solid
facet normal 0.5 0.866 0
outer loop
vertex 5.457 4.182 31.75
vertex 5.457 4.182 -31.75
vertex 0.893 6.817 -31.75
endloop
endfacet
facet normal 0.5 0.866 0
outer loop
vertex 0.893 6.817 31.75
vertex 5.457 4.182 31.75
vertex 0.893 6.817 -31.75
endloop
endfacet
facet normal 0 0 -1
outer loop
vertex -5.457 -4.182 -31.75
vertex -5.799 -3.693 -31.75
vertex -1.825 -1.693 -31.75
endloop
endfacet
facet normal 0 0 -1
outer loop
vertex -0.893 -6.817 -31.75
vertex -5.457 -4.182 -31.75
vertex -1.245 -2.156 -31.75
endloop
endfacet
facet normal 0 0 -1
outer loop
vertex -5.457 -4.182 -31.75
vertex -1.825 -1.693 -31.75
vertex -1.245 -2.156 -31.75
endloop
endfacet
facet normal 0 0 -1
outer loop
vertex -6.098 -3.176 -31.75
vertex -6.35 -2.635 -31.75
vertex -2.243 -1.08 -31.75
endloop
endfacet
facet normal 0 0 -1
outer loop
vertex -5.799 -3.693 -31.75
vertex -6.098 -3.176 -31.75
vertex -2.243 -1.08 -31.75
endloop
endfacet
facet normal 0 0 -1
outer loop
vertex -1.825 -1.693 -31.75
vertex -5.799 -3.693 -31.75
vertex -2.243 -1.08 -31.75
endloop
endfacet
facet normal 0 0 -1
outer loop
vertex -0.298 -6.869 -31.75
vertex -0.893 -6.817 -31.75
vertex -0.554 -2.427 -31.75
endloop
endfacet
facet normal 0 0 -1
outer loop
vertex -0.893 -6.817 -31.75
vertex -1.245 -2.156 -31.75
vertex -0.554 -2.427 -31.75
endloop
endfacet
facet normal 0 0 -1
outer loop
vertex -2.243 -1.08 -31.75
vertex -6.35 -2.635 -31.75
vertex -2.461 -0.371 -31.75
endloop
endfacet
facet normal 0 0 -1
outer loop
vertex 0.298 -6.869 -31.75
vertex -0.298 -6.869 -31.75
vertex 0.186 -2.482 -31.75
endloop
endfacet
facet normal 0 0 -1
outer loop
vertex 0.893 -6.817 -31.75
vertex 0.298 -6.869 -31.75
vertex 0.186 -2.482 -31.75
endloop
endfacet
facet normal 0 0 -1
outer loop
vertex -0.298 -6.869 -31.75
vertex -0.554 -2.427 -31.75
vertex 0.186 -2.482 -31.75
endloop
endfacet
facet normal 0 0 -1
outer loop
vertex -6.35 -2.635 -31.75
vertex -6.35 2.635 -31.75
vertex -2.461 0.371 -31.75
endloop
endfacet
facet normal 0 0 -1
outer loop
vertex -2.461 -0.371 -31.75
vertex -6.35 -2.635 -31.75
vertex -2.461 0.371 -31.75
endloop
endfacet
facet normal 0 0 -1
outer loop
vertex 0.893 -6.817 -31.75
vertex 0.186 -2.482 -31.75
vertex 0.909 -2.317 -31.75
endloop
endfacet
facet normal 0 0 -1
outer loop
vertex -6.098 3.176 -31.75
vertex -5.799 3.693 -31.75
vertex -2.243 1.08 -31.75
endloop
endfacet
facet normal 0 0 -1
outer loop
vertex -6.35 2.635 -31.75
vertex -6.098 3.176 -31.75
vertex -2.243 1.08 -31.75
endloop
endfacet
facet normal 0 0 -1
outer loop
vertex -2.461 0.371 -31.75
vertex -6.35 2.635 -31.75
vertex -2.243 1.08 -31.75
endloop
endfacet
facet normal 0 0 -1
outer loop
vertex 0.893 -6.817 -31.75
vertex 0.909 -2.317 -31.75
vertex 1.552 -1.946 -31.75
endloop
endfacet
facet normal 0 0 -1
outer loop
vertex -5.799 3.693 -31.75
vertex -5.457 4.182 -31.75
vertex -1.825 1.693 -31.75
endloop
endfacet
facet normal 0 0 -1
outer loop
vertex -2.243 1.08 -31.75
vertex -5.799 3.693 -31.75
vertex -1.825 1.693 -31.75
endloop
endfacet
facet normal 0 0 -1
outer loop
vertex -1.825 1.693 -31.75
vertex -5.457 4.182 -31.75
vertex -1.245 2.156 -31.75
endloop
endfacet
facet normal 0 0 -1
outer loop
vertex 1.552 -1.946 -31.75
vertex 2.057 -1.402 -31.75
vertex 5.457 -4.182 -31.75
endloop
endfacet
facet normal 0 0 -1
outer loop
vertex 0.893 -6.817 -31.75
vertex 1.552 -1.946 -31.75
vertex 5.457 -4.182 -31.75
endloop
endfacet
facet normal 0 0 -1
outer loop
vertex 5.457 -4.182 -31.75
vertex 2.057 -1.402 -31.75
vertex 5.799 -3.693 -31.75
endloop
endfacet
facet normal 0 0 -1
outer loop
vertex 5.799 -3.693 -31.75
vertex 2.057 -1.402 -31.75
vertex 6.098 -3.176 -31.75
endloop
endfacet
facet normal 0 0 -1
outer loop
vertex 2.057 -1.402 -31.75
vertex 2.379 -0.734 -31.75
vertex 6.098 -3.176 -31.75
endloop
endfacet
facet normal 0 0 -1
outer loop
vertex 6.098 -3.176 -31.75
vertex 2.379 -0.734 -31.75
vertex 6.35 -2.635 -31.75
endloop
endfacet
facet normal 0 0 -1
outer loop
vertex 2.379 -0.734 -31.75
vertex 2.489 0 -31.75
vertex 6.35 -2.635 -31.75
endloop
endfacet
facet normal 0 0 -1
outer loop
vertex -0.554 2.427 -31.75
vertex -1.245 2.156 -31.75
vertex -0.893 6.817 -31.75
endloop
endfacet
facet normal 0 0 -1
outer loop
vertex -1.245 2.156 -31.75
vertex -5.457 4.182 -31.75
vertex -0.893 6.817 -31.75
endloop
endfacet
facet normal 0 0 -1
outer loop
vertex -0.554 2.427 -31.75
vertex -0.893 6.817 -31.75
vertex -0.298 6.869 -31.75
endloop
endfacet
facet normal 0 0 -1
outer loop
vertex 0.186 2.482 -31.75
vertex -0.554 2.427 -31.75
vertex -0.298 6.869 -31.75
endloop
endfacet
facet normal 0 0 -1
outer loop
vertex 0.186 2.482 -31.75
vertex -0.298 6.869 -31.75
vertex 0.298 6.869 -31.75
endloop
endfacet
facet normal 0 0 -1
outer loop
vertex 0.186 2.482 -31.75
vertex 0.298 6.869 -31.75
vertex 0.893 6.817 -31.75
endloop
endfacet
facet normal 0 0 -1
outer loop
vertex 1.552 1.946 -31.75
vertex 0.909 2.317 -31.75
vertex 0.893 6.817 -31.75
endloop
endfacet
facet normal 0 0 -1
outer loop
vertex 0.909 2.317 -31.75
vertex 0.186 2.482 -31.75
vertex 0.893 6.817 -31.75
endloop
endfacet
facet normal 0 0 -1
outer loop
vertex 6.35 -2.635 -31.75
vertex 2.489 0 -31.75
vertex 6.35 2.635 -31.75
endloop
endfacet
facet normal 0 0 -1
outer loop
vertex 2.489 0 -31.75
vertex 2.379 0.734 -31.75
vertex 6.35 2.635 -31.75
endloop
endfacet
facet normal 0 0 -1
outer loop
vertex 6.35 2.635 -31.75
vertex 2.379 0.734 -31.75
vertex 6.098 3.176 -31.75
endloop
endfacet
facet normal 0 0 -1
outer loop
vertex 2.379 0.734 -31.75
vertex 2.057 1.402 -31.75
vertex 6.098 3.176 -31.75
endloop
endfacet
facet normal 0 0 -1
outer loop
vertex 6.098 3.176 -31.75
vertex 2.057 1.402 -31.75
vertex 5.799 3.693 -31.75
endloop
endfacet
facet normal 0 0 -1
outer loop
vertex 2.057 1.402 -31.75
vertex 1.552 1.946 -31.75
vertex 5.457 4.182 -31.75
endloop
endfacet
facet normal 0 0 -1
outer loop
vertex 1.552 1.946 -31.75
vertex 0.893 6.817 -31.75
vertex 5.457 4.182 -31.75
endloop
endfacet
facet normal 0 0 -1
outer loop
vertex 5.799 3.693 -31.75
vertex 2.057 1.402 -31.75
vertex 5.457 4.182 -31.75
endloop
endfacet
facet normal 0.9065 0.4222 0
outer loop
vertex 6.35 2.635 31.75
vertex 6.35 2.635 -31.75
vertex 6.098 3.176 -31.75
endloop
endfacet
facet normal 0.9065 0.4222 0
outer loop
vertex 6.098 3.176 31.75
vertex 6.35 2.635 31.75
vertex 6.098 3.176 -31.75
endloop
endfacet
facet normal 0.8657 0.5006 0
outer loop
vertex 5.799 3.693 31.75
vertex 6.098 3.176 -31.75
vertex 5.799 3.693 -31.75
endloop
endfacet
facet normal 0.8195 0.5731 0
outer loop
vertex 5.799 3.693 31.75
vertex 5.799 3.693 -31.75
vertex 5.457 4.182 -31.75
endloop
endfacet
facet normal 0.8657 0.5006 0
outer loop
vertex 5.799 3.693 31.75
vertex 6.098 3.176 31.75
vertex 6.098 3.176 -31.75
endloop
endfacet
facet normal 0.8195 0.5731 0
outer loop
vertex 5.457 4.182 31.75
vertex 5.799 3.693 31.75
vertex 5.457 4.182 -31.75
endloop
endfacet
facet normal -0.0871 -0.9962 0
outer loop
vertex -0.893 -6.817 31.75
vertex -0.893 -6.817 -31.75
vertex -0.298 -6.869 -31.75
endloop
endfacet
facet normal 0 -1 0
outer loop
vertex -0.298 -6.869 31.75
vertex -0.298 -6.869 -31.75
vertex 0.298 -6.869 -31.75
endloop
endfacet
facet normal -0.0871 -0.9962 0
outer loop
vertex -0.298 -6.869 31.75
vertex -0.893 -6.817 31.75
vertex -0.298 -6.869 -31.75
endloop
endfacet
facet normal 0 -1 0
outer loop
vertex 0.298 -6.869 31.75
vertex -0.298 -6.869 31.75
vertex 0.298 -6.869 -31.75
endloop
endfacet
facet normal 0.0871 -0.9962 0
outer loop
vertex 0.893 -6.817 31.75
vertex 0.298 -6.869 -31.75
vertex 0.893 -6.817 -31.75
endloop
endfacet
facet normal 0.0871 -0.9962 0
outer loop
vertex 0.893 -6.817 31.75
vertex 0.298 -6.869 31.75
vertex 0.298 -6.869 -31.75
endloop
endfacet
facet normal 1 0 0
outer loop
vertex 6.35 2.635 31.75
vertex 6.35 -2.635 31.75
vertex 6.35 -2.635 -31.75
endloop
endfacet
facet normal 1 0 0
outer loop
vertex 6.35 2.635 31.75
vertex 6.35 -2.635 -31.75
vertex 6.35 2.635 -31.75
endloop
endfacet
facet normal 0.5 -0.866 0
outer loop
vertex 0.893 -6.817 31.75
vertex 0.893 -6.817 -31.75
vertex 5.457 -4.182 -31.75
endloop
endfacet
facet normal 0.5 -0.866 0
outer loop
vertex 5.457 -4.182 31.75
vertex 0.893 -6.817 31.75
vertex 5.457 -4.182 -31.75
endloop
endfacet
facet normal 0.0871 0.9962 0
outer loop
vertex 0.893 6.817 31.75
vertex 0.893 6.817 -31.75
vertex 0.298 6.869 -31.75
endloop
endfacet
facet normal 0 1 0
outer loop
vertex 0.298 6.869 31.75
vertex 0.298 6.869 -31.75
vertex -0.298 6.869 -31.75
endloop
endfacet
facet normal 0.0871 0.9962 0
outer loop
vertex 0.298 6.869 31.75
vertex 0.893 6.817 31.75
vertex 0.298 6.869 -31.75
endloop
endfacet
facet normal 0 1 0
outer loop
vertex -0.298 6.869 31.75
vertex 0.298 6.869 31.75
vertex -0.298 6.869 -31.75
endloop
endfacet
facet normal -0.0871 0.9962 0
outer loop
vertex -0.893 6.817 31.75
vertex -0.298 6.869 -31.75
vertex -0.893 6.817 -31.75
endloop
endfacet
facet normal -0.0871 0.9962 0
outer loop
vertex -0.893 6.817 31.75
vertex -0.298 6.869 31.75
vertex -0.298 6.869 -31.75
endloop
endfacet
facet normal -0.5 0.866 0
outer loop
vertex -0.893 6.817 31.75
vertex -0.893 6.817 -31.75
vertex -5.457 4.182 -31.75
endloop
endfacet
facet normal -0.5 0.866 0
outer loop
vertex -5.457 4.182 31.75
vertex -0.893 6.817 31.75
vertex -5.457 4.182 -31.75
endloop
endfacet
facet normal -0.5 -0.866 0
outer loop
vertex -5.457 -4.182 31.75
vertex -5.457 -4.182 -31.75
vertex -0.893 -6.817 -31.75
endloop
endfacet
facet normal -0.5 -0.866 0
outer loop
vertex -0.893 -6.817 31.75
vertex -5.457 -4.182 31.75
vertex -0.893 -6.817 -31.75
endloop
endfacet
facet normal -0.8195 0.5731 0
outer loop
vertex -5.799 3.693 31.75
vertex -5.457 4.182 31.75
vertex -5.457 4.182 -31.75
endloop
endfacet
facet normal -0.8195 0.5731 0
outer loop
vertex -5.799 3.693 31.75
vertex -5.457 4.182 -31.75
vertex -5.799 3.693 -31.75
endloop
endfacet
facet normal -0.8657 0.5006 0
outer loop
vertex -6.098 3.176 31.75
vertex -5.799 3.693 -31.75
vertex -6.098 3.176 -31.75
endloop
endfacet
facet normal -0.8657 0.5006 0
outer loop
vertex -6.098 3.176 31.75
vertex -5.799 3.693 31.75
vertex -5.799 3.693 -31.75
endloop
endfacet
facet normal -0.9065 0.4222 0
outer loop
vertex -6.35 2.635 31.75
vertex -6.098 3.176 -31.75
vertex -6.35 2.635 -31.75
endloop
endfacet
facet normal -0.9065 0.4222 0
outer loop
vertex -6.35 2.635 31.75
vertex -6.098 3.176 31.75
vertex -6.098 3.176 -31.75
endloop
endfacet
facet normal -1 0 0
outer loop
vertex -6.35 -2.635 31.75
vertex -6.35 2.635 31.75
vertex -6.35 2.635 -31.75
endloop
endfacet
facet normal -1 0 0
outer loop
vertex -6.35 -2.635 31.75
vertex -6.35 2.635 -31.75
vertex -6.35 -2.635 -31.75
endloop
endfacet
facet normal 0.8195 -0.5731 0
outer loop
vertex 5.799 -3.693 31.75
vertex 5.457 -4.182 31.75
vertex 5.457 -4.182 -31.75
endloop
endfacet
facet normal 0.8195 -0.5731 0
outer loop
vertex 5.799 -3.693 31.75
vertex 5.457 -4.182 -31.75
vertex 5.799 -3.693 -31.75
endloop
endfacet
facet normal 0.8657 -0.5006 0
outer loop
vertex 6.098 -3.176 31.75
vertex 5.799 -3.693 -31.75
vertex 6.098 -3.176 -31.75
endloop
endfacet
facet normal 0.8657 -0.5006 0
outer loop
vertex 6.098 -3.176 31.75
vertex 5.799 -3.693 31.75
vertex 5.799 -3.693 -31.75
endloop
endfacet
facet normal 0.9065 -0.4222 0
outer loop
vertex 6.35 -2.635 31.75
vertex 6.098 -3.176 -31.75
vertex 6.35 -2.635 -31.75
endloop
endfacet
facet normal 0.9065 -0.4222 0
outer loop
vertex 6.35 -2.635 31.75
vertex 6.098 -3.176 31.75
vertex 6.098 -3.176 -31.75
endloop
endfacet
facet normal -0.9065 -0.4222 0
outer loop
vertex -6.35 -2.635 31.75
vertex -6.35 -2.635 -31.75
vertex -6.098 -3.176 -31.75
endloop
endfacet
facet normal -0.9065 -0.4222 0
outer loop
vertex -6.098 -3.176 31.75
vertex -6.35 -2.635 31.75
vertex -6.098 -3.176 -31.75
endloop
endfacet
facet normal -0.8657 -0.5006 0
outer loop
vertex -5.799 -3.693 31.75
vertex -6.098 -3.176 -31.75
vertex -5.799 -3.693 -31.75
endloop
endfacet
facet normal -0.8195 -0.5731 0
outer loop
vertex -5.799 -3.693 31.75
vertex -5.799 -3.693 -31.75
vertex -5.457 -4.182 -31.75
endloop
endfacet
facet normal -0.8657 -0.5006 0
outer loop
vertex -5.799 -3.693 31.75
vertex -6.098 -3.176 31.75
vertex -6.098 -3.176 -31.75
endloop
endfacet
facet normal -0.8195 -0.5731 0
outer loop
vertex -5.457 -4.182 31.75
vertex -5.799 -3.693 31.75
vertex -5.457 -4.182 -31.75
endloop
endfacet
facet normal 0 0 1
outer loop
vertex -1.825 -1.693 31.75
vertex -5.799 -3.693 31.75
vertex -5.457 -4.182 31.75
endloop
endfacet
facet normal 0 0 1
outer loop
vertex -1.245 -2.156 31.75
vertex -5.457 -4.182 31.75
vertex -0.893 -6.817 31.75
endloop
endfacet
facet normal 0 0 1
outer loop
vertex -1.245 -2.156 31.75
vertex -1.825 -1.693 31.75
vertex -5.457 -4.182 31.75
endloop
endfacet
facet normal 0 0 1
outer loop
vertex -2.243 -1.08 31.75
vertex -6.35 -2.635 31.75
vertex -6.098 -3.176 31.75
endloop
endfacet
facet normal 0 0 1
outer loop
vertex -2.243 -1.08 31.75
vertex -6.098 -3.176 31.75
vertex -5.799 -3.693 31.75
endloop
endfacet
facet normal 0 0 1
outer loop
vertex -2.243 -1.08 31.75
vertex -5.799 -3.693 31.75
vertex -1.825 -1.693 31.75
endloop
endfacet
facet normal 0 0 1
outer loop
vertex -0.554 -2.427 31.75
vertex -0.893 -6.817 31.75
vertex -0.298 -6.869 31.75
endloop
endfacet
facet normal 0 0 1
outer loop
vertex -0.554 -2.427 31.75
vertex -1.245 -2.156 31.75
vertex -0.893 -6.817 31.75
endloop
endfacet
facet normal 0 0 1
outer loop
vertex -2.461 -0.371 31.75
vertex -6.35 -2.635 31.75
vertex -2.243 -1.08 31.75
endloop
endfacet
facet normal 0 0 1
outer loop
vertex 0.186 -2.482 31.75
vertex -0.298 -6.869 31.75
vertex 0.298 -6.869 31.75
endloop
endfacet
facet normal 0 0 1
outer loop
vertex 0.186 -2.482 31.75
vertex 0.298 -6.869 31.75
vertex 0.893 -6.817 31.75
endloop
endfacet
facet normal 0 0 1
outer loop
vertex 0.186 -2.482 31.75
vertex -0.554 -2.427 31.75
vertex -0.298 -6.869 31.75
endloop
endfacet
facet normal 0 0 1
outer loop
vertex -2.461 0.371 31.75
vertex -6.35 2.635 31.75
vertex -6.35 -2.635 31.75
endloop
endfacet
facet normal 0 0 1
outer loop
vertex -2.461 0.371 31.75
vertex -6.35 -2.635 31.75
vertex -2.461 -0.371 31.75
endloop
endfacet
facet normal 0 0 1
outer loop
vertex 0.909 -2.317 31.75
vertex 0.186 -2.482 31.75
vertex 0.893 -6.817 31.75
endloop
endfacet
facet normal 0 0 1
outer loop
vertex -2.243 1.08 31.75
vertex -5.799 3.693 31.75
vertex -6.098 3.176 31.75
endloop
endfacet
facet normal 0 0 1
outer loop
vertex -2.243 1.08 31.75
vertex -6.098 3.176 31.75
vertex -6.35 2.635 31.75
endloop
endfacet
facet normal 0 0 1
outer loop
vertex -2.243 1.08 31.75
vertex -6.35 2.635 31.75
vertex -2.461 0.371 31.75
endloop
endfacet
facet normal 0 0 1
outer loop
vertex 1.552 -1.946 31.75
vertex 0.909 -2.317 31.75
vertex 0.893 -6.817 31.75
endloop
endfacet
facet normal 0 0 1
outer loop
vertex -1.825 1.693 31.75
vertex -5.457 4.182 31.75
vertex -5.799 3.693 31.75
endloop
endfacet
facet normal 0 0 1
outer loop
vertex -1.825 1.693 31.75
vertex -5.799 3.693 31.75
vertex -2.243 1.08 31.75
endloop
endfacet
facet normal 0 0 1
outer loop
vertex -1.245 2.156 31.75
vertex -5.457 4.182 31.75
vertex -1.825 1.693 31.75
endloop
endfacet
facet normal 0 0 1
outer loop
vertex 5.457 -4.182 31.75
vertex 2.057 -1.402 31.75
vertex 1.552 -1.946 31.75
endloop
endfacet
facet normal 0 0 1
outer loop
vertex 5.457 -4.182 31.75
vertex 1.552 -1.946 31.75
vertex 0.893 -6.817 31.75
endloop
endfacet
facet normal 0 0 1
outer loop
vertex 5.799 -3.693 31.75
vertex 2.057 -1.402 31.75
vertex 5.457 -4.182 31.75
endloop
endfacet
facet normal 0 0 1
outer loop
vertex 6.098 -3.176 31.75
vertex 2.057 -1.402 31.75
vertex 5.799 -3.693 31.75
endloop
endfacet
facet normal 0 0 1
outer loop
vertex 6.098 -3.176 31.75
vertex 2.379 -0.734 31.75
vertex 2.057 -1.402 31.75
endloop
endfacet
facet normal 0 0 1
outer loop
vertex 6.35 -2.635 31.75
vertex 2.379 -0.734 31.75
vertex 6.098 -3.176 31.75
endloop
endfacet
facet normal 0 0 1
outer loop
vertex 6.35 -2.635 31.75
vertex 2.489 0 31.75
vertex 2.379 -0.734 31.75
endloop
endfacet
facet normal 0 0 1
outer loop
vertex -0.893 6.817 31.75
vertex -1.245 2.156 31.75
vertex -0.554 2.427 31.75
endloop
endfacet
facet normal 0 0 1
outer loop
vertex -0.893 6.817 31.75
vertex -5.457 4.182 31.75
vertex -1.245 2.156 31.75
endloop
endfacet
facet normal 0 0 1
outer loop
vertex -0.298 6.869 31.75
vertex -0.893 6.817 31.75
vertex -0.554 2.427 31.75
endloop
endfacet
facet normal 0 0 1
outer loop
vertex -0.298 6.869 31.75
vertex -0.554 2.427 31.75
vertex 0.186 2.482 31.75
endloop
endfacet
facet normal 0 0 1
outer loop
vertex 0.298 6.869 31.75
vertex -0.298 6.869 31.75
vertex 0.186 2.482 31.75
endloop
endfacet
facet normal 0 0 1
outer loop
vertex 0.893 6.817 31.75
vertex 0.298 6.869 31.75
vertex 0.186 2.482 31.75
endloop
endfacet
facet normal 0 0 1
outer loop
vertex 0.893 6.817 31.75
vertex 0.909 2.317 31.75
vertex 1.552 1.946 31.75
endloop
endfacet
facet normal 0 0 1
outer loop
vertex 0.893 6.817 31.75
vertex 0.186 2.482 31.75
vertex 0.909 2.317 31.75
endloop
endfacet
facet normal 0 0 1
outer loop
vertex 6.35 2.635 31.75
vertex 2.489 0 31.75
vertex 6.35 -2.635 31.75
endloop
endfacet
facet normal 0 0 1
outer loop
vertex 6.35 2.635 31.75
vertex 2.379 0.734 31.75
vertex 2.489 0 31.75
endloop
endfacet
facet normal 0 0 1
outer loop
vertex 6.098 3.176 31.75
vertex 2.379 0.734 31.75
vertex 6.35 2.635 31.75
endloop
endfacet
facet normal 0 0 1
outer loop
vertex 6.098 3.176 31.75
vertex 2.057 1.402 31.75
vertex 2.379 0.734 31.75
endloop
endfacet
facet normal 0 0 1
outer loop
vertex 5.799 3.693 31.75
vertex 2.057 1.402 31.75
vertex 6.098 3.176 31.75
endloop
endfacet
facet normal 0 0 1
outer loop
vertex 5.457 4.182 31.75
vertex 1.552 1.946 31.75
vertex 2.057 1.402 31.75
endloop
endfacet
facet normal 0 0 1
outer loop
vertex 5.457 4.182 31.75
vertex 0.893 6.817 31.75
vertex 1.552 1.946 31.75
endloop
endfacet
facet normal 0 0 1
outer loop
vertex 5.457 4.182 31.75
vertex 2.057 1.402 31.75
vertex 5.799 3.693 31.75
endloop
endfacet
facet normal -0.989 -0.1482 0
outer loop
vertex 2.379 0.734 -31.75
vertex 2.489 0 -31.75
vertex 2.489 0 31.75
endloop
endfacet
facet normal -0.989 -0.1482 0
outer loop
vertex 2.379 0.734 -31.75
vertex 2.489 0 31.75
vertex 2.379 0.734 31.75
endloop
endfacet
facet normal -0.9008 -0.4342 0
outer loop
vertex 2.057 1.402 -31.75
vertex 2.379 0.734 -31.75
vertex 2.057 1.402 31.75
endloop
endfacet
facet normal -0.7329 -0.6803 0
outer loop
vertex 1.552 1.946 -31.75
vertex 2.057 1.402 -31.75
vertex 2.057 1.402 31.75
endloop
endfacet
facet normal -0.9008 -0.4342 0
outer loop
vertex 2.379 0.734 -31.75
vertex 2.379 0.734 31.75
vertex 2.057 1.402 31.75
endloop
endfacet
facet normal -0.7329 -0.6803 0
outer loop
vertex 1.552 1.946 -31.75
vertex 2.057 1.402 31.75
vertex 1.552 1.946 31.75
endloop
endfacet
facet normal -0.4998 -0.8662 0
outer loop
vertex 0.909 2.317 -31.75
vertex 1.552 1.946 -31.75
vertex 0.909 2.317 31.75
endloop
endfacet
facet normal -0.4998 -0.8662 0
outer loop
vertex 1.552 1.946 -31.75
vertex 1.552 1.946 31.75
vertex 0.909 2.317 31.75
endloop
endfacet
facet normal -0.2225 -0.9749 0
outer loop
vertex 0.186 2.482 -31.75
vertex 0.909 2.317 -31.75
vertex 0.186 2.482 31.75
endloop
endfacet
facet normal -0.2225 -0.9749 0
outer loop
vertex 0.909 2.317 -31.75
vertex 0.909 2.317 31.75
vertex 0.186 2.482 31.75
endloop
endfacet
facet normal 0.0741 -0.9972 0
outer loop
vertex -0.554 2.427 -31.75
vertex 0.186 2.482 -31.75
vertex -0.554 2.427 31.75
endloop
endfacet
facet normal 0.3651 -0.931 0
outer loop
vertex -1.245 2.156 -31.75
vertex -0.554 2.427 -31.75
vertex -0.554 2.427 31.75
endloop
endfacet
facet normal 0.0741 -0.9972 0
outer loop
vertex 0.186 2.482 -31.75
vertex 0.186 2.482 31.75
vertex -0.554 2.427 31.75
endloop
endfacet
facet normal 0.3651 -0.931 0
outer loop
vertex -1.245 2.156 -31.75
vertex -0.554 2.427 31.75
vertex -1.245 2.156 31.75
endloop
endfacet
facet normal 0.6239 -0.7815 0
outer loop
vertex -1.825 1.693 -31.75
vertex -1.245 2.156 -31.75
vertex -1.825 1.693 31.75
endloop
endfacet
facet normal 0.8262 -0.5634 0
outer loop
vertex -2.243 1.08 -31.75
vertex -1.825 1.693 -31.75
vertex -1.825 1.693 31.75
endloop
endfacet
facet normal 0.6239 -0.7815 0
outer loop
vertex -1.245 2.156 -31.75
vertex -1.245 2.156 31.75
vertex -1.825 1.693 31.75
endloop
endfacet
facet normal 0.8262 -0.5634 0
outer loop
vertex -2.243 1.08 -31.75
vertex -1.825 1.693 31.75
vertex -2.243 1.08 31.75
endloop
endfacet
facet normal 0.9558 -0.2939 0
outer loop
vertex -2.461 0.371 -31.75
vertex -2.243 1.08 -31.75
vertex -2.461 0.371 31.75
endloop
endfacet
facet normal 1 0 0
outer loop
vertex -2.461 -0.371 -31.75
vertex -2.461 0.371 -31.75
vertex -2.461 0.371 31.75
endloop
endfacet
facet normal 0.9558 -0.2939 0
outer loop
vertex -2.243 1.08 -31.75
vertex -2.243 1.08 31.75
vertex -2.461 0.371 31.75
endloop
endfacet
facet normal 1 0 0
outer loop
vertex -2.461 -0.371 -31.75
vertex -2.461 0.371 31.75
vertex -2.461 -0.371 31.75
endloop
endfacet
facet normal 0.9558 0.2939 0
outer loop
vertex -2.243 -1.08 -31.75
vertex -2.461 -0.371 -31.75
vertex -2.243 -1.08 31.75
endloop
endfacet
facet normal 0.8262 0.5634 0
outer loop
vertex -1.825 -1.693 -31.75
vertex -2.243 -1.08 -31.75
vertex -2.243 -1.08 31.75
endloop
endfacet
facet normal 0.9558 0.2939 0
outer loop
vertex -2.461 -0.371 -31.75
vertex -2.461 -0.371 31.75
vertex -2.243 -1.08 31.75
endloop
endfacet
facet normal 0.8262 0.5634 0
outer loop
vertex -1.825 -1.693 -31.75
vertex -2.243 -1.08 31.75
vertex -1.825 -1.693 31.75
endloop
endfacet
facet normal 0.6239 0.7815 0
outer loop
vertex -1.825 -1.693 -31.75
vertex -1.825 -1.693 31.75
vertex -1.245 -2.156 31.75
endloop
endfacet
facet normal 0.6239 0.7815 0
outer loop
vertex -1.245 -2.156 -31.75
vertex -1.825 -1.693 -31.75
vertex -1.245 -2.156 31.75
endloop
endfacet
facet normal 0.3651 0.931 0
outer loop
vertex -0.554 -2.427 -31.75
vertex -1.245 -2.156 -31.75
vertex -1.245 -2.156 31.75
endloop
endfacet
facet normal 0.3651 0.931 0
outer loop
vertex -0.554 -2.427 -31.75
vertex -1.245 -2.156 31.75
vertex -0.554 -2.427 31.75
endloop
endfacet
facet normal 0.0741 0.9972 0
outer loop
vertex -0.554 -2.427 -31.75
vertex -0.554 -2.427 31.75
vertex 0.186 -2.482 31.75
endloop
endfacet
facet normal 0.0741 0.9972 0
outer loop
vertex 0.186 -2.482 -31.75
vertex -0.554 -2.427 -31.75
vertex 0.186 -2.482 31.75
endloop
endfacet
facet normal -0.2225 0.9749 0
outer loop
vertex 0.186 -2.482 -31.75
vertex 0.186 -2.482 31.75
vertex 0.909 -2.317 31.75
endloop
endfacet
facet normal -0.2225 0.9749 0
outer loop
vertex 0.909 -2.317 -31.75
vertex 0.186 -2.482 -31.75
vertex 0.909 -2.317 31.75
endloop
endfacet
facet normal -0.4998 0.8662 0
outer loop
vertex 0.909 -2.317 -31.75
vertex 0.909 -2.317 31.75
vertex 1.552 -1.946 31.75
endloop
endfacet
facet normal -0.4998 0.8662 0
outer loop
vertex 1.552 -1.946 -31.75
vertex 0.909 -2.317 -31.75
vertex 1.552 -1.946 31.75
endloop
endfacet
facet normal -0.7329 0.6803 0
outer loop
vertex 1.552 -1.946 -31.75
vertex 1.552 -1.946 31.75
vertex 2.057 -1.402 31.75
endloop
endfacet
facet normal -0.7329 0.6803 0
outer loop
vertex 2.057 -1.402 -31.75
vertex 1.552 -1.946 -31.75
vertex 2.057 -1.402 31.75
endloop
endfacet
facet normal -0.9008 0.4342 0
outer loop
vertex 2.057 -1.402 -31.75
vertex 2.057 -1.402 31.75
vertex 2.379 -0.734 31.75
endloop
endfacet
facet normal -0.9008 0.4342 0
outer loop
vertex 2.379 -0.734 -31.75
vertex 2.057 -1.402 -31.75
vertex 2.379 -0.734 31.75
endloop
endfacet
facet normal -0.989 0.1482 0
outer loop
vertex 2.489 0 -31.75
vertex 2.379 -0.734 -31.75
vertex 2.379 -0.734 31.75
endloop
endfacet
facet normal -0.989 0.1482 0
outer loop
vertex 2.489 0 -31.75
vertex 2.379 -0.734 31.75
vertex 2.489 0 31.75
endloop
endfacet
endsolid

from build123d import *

# Parameters (mm, degrees)
BOSS_EXTRUDE1_DEPTH = 31.75
SKETCH3_R           = 2.4892
CUT_EXTRUDE1_DEPTH  = 65.185965172


with BuildPart() as part:
    # Sketch1 → Boss-Extrude1 (new, symmetric)
    with BuildSketch(Plane.XY):
        with BuildLine():
            Line((-0.893039494, 6.816751826), (-5.456960506, 4.181770802))
            ThreePointArc((-5.456960506, 4.181770802), (-5.953924651, 3.4375), (-6.35, 2.634981025))
            Line((-6.35, 2.634981025), (-6.35, -2.634981025))
            ThreePointArc((-6.35, -2.634981025), (-5.953924651, -3.4375), (-5.456960506, -4.181770802))
            Line((-5.456960506, -4.181770802), (-0.893039494, -6.816751826))
            ThreePointArc((-0.893039494, -6.816751826), (0, -6.875), (0.893039494, -6.816751826))
            Line((0.893039494, -6.816751826), (5.456960506, -4.181770802))
            ThreePointArc((5.456960506, -4.181770802), (5.953924651, -3.4375), (6.35, -2.634981025))
            Line((6.35, -2.634981025), (6.35, 2.634981025))
            ThreePointArc((6.35, 2.634981025), (5.953924651, 3.4375), (5.456960506, 4.181770802))
            Line((5.456960506, 4.181770802), (0.893039494, 6.816751826))
            ThreePointArc((0.893039494, 6.816751826), (0, 6.875), (-0.893039494, 6.816751826))
        make_face()
    extrude(amount=BOSS_EXTRUDE1_DEPTH, both=True)

    # Sketch3 → Cut-Extrude1 (cut, through all)
    with BuildSketch(Plane.XY.offset(31.75)):
        Circle(SKETCH3_R)
    extrude(amount=-CUT_EXTRUDE1_DEPTH, mode=Mode.SUBTRACT)


solid = part.part
